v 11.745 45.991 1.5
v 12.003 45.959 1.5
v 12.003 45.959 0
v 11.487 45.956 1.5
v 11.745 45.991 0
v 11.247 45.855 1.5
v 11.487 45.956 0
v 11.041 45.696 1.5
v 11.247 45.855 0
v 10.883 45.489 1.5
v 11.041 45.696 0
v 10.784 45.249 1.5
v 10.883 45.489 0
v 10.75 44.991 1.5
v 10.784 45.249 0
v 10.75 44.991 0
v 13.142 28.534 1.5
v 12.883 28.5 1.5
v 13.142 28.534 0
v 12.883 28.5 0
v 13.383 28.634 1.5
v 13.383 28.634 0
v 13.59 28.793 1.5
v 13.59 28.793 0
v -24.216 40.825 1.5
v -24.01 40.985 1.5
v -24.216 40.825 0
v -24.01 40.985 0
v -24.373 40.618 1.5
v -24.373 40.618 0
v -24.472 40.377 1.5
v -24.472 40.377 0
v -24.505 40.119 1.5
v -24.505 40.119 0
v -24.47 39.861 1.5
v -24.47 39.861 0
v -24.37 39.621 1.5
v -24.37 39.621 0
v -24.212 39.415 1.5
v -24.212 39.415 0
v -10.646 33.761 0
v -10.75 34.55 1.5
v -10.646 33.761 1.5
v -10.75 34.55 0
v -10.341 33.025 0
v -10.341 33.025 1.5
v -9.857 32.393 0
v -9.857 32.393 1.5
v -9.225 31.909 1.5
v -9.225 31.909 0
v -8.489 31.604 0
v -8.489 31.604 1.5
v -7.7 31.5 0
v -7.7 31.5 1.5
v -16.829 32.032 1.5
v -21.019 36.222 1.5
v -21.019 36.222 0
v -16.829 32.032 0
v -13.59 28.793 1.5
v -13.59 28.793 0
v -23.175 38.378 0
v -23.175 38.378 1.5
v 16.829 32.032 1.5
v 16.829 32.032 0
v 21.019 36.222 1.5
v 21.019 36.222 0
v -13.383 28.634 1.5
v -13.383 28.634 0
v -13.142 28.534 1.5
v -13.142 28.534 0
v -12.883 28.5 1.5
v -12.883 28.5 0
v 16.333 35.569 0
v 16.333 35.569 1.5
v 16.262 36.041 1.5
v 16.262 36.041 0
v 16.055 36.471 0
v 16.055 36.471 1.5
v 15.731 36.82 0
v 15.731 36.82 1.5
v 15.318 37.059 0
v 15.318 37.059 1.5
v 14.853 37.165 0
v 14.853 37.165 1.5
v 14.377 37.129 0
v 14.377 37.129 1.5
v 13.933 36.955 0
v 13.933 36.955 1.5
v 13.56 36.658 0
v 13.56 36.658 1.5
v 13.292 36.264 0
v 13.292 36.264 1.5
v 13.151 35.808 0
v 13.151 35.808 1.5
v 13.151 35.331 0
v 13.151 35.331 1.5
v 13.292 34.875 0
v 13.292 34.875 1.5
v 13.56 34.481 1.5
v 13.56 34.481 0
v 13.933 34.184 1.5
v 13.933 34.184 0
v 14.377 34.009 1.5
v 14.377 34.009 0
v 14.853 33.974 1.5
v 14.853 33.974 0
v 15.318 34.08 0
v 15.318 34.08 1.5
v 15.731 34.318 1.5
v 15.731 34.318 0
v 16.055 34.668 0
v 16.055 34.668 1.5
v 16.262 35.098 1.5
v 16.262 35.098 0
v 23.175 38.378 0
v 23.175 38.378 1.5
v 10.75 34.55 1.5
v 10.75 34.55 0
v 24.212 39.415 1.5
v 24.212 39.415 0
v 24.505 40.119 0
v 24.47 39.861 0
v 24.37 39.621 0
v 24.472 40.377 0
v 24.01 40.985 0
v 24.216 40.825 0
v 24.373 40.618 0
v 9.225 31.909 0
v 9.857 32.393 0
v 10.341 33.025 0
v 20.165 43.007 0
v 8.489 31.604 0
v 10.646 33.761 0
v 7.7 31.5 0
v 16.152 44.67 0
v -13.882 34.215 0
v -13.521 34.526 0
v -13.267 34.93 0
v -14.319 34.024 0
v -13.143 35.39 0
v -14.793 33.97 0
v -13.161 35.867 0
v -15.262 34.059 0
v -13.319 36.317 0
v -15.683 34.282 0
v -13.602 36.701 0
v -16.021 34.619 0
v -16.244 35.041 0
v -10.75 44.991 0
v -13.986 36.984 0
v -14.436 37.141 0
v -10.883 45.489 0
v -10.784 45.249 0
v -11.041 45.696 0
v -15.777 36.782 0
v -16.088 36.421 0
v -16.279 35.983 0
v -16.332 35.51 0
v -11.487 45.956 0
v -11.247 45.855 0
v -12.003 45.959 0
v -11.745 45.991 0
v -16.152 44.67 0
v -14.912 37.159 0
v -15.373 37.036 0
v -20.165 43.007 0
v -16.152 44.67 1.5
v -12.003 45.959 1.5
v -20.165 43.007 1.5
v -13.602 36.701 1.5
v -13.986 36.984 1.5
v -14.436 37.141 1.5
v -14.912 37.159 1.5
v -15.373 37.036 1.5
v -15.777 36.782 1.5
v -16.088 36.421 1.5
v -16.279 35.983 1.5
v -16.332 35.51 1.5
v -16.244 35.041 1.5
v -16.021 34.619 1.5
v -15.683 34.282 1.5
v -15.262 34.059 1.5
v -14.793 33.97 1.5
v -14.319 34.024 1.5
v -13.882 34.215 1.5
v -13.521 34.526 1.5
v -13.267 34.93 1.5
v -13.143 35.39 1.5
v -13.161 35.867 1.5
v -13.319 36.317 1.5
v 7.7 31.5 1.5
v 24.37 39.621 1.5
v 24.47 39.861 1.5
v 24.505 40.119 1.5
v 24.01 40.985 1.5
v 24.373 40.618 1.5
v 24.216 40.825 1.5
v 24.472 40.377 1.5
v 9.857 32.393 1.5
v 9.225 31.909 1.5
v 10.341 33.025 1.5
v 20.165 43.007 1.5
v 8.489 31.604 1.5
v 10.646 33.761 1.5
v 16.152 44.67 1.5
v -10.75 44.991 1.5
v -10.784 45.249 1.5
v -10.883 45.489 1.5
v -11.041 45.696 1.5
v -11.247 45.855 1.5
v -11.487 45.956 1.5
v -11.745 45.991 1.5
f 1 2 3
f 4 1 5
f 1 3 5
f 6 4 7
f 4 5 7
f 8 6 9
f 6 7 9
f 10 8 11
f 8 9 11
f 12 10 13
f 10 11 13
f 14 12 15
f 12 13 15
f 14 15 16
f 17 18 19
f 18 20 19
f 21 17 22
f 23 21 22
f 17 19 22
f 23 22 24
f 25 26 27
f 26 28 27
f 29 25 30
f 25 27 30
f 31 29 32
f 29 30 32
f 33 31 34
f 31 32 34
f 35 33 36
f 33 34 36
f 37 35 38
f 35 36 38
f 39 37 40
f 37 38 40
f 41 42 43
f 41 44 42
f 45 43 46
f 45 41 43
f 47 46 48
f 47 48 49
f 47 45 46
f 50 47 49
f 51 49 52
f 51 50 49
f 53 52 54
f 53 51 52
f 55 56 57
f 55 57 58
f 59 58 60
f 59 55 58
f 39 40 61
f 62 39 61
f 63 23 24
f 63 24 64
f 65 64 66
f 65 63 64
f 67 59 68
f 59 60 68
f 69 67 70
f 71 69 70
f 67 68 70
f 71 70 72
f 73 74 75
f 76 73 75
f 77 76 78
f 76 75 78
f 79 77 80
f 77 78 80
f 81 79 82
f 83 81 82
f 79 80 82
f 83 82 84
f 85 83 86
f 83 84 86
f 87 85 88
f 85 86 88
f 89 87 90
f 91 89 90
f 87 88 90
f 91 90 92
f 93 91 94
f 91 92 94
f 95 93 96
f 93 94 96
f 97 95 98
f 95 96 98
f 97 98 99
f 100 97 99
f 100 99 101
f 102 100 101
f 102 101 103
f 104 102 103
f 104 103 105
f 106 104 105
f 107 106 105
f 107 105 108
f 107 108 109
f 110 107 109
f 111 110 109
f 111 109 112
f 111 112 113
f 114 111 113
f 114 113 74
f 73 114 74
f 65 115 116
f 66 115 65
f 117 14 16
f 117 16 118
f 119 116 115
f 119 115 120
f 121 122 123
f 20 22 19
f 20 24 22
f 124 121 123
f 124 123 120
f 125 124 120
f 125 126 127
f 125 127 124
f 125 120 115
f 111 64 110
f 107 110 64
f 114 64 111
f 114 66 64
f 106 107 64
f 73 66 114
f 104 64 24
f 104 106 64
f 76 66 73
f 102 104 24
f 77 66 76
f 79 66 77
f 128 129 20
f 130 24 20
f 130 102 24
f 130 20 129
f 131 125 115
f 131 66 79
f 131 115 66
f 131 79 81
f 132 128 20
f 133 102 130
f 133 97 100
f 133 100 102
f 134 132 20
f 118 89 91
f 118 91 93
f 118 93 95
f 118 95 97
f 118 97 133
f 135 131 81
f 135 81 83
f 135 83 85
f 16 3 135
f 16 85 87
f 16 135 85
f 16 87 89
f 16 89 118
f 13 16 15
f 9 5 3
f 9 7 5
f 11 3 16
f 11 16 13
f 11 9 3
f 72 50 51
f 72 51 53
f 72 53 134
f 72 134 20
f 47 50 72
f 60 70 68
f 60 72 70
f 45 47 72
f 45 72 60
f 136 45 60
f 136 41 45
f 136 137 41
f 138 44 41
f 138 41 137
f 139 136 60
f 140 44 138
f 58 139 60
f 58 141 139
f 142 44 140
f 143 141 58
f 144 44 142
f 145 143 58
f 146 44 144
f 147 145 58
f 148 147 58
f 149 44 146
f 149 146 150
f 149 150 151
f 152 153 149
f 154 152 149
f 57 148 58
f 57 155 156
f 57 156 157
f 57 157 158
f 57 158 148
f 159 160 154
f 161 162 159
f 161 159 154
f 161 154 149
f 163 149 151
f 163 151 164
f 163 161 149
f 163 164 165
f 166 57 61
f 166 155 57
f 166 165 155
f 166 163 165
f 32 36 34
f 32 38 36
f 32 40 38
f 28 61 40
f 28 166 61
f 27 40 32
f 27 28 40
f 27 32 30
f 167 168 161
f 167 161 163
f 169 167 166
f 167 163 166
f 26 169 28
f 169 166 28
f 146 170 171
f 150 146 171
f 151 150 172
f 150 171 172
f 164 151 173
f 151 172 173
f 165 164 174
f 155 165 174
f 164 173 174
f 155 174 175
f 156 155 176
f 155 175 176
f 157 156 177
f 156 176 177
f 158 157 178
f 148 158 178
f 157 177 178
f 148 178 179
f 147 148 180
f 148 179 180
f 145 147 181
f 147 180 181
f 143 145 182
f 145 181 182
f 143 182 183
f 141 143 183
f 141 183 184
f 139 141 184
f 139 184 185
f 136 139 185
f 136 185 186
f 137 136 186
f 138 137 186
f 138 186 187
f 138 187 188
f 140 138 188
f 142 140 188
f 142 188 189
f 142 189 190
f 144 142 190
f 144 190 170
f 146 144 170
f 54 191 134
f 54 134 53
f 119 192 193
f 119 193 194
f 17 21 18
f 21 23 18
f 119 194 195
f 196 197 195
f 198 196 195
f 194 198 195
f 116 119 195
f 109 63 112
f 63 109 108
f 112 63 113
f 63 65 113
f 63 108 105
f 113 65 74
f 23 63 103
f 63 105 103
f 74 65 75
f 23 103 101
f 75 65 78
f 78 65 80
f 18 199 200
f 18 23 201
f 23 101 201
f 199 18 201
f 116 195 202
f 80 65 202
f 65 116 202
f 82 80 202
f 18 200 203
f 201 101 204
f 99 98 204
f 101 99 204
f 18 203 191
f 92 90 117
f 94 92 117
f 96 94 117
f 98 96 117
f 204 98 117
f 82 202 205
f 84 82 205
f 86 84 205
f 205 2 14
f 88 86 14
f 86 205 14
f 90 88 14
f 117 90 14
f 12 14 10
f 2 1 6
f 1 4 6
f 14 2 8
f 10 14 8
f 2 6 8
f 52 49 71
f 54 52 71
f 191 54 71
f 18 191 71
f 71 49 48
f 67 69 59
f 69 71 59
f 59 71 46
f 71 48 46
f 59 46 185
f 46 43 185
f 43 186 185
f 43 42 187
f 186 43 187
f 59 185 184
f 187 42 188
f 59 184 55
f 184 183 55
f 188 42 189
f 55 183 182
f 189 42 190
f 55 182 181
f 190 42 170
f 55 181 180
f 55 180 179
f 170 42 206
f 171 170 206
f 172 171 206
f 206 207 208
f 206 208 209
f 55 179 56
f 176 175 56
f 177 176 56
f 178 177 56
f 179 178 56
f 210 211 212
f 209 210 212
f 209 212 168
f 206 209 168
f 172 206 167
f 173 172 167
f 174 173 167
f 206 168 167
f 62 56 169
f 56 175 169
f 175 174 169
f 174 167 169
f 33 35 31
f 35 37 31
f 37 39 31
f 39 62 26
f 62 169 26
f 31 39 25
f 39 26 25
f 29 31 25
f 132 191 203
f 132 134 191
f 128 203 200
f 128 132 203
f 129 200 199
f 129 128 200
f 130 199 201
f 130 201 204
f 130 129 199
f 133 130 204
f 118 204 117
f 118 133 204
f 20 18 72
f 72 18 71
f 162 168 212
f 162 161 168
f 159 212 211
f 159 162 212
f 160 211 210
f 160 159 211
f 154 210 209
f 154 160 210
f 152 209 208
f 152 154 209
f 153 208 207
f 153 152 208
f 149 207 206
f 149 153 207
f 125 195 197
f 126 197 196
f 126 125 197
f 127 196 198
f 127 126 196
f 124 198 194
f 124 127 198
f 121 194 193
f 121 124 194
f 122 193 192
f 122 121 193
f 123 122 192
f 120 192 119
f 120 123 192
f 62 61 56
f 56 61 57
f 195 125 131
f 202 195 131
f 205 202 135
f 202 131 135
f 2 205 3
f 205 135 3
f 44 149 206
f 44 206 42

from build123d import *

# Parameters (mm, degrees)
SKETCH_1_R                       = 47.5
EXTRUDE_1_DEPTH                  = 1.5
CUT_EXTRUDE_1_DEPTH              = 68.191889392
CUT_EXTRUDE_2_DEPTH              = 68.191889392
CUT_EXTRUDE_2_DEPTH_BACK         = 68.191889392
SKETCH_3_R                       = 3.1
SKETCH_3_R_2                     = 1.6
SKETCH_4_R                       = 1.6
CUT_EXTRUDE_3_DEPTH              = 68.191889392
CUT_EXTRUDE_4_DEPTH              = 68.191889392
FILLET_1_R                       = 1
FILLET_2_R                       = 0.2
FILLET_3_R                       = 3.05
PATTERN_CIRCULAR_1_COUNT         = 8
FILLET_1_OF_PATTERN_CIRCULAR_1_R = 1
FILLET_2_OF_PATTERN_CIRCULAR_1_R = 0.2
FILLET_3_OF_PATTERN_CIRCULAR_1_R = 3.05
CUT_EXTRUDE_5_DEPTH              = 66.05834985
EXTRUDE_START                    = -1.5
EXTRUDE_2_DEPTH                  = 1.5
FILLET_4_R                       = 1


with BuildPart() as part:
    # ｽｹｯﾁ1 → ﾎﾞｽ - 押し出し1 (new body)
    with BuildSketch(Plane.XY):
        Circle(SKETCH_1_R)
    extrude(amount=EXTRUDE_1_DEPTH)

    # ｽｹｯﾁ2 → ｶｯﾄ - 押し出し1 (cut, through all)
    with BuildSketch(Plane.XY.offset(1.5)):
        Polygon((-10.75, 43.525), (-10.75, 52.5), (10.75, 52.5), (10.75, 43.525), (13, 43.525), (13, 40.475), (10.75, 40.475), (10.75, 31.5), (-10.75, 31.5), (-10.75, 40.475), (-13, 40.475), (-13, 43.525), align=None)
    cut_extrude_1 = extrude(amount=-CUT_EXTRUDE_1_DEPTH, mode=Mode.SUBTRACT)

    # ｽｹｯﾁ3 → ｶｯﾄ - 押し出し2 (cut, two sides: drawn at the far end of the back side and taken through both)
    with BuildSketch(Plane.XY.offset(1.5).offset(-CUT_EXTRUDE_2_DEPTH_BACK)):
        Circle(SKETCH_3_R)
        with Locations((0, 6.5)):
            Circle(SKETCH_3_R_2)
        with Locations((6.5, 0)):
            Circle(SKETCH_3_R_2)
        with Locations((0, -6.5)):
            Circle(SKETCH_3_R_2)
        with Locations((-6.5, 0)):
            Circle(SKETCH_3_R_2)
        with Locations((8.838834765, 8.838834765)):
            Circle(SKETCH_3_R_2)
        with Locations((8.838834765, -8.838834765)):
            Circle(SKETCH_3_R_2)
        with Locations((-8.838834765, -8.838834765)):
            Circle(SKETCH_3_R_2)
        with Locations((-8.838834765, 8.838834765)):
            Circle(SKETCH_3_R_2)
    extrude(amount=CUT_EXTRUDE_2_DEPTH + CUT_EXTRUDE_2_DEPTH_BACK, mode=Mode.SUBTRACT)

    # ｽｹｯﾁ4 → ｶｯﾄ - 押し出し3 (cut, through all)
    with BuildSketch(Plane.XY.offset(1.5)):
        with Locations((14.733312146, 35.569362002)):
            Circle(SKETCH_4_R)
        with Locations((8.610377228, 20.787289482)):
            Circle(SKETCH_4_R)
    cut_extrude_3 = extrude(amount=-CUT_EXTRUDE_3_DEPTH, mode=Mode.SUBTRACT)

    # ｽｹｯﾁ5 → ｶｯﾄ - 押し出し4 (cut, symmetric)
    with BuildSketch(Plane.XY.offset(1.5)):
        Polygon((-7.188286702, 26.5), (7.188286702, 26.5), (3.328075632, 17.180626082), (-3.328075632, 17.180626082), align=None)
    cut_extrude_4 = extrude(amount=CUT_EXTRUDE_4_DEPTH, both=True, mode=Mode.SUBTRACT)

    # ﾌｨﾚｯﾄ1
    fillet_1_edges = [part.edges().sort_by_distance(p)[0] for p in [
        (-3.328075632, 17.180626082, 0.75),
        (3.328075632, 17.180626082, 0.75),
        (7.188286702, 26.5, 0.75),
        (-7.188286702, 26.5, 0.75),
        (10.75, 46.267564232, 0.75),
        (-10.75, 46.267564232, 0.75),
    ]]
    fillet(fillet_1_edges, radius=FILLET_1_R)

    # ﾌｨﾚｯﾄ2
    fillet_2_edges = [part.edges().sort_by_distance(p)[0] for p in [
        (13, 43.525, 0.75),
        (13, 40.475, 0.75),
        (-13, 43.525, 0.75),
        (-13, 40.475, 0.75),
    ]]
    fillet(fillet_2_edges, radius=FILLET_2_R)

    # ﾌｨﾚｯﾄ3
    fillet_3_edges = [part.edges().sort_by_distance(p)[0] for p in [
        (10.75, 31.5, 0.75),
        (-10.75, 31.5, 0.75),
    ]]
    fillet(fillet_3_edges, radius=FILLET_3_R)

    # 円形ﾊﾟﾀｰﾝ1: ｶｯﾄ - 押し出し1, ｶｯﾄ - 押し出し3, ｶｯﾄ - 押し出し4 ×8 about axis
    pattern_circular_1_axis = Axis((0, 0, 0), (0, 0, 1))
    add([cut_extrude_1.rotate(pattern_circular_1_axis, i * 360 / PATTERN_CIRCULAR_1_COUNT) for i in range(1, PATTERN_CIRCULAR_1_COUNT)], mode=Mode.SUBTRACT)
    add([cut_extrude_3.rotate(pattern_circular_1_axis, i * 360 / PATTERN_CIRCULAR_1_COUNT) for i in range(1, PATTERN_CIRCULAR_1_COUNT)], mode=Mode.SUBTRACT)
    add([cut_extrude_4.rotate(pattern_circular_1_axis, i * 360 / PATTERN_CIRCULAR_1_COUNT) for i in range(1, PATTERN_CIRCULAR_1_COUNT)], mode=Mode.SUBTRACT)

    # ﾌｨﾚｯﾄ1 of 円形ﾊﾟﾀｰﾝ1
    fillet_1_of_pattern_circular_1_edges = [part.edges().sort_by_distance(p)[0] for p in [
        (-14.501842056, 9.79523236, 0.75),
        (-9.79523236, 14.501842056, 0.75),
        (-13.655443429, 23.821215973, 0.75),
        (-23.821215973, 13.655443429, 0.75),
        (-25.11471052, 40.317506315, 0.75),
        (-40.317506315, 25.11471052, 0.75),
        (-17.180626082, -3.328075632, 0.75),
        (-17.180626082, 3.328075632, 0.75),
        (-26.5, 7.188286702, 0.75),
        (-26.5, -7.188286702, 0.75),
        (-46.267564232, 10.75, 0.75),
        (-46.267564232, -10.75, 0.75),
        (-9.79523236, -14.501842056, 0.75),
        (-14.501842056, -9.79523236, 0.75),
        (-23.821215973, -13.655443429, 0.75),
        (-13.655443429, -23.821215973, 0.75),
        (-40.317506315, -25.11471052, 0.75),
        (-25.11471052, -40.317506315, 0.75),
        (3.328075632, -17.180626082, 0.75),
        (-3.328075632, -17.180626082, 0.75),
        (-7.188286702, -26.5, 0.75),
        (7.188286702, -26.5, 0.75),
        (-10.75, -46.267564232, 0.75),
        (10.75, -46.267564232, 0.75),
        (14.501842056, -9.79523236, 0.75),
        (9.79523236, -14.501842056, 0.75),
        (13.655443429, -23.821215973, 0.75),
        (23.821215973, -13.655443429, 0.75),
        (25.11471052, -40.317506315, 0.75),
        (40.317506315, -25.11471052, 0.75),
        (17.180626082, 3.328075632, 0.75),
        (17.180626082, -3.328075632, 0.75),
        (26.5, -7.188286702, 0.75),
        (26.5, 7.188286702, 0.75),
        (46.267564232, -10.75, 0.75),
        (46.267564232, 10.75, 0.75),
        (9.79523236, 14.501842056, 0.75),
        (14.501842056, 9.79523236, 0.75),
        (23.821215973, 13.655443429, 0.75),
        (13.655443429, 23.821215973, 0.75),
        (40.317506315, 25.11471052, 0.75),
        (25.11471052, 40.317506315, 0.75),
    ]]
    fillet(fillet_1_of_pattern_circular_1_edges, radius=FILLET_1_OF_PATTERN_CIRCULAR_1_R)

    # ﾌｨﾚｯﾄ2 of 円形ﾊﾟﾀｰﾝ1
    fillet_2_of_pattern_circular_1_edges = [part.edges().sort_by_distance(p)[0] for p in [
        (-21.584434496, 39.969210807, 0.75),
        (-19.427758813, 37.812535124, 0.75),
        (-39.969210807, 21.584434496, 0.75),
        (-37.812535124, 19.427758813, 0.75),
        (-43.525, 13, 0.75),
        (-40.475, 13, 0.75),
        (-43.525, -13, 0.75),
        (-40.475, -13, 0.75),
        (-39.969210807, -21.584434496, 0.75),
        (-37.812535124, -19.427758813, 0.75),
        (-21.584434496, -39.969210807, 0.75),
        (-19.427758813, -37.812535124, 0.75),
        (-13, -43.525, 0.75),
        (-13, -40.475, 0.75),
        (13, -43.525, 0.75),
        (13, -40.475, 0.75),
        (21.584434496, -39.969210807, 0.75),
        (19.427758813, -37.812535124, 0.75),
        (39.969210807, -21.584434496, 0.75),
        (37.812535124, -19.427758813, 0.75),
        (43.525, -13, 0.75),
        (40.475, -13, 0.75),
        (43.525, 13, 0.75),
        (40.475, 13, 0.75),
        (39.969210807, 21.584434496, 0.75),
        (37.812535124, 19.427758813, 0.75),
        (21.584434496, 39.969210807, 0.75),
        (19.427758813, 37.812535124, 0.75),
    ]]
    fillet(fillet_2_of_pattern_circular_1_edges, radius=FILLET_2_OF_PATTERN_CIRCULAR_1_R)

    # ﾌｨﾚｯﾄ3 of 円形ﾊﾟﾀｰﾝ1
    fillet_3_of_pattern_circular_1_edges = [part.edges().sort_by_distance(p)[0] for p in [
        (-14.67246571, 29.875261505, 0.75),
        (-29.875261505, 14.67246571, 0.75),
        (-31.5, 10.75, 0.75),
        (-31.5, -10.75, 0.75),
        (-29.875261505, -14.67246571, 0.75),
        (-14.67246571, -29.875261505, 0.75),
        (-10.75, -31.5, 0.75),
        (10.75, -31.5, 0.75),
        (14.67246571, -29.875261505, 0.75),
        (29.875261505, -14.67246571, 0.75),
        (31.5, -10.75, 0.75),
        (31.5, 10.75, 0.75),
        (29.875261505, 14.67246571, 0.75),
        (14.67246571, 29.875261505, 0.75),
    ]]
    fillet(fillet_3_of_pattern_circular_1_edges, radius=FILLET_3_OF_PATTERN_CIRCULAR_1_R)

    # ｽｹｯﾁ6 → ｶｯﾄ - 押し出し5 (cut, through all)
    with BuildSketch(Plane.XY.offset(1.5)):
        with BuildLine():
            Line((13.297204204, 28.5), (7.7, 28.5))
            Line((7.7, 28.5), (-7.7, 28.5))
            Line((-7.7, 28.5), (-13.297204204, 28.5))
            Line((-13.297204204, 28.5), (-16.829141392, 32.031937188))
            ThreePointArc((-16.829141392, 32.031937188), (-15.935817075, 29.875261505), (-16.829141392, 27.718585823))
            Line((-16.829141392, 27.718585823), (-27.718585823, 16.829141392))
            ThreePointArc((-27.718585823, 16.829141392), (-29.875261505, 15.935817075), (-32.031937188, 16.829141392))
            Line((-32.031937188, 16.829141392), (-36.221544866, 21.018749071))
            Line((-36.221544866, 21.018749071), (-37.671113768, 19.569180169))
            ThreePointArc((-37.671113768, 19.569180169), (-37.812535124, 19.510601526), (-37.95395648, 19.569180169))
            Line((-37.95395648, 19.569180169), (-39.82778945, 21.443013139))
            ThreePointArc((-39.82778945, 21.443013139), (-39.886368094, 21.584434496), (-39.82778945, 21.725855852))
            Line((-39.82778945, 21.725855852), (-38.378220549, 23.175424753))
            Line((-38.378220549, 23.175424753), (-39.414818808, 24.212023012))
            ThreePointArc((-39.414818808, 24.212023012), (-40.249307357, 24.496769993), (-40.984762698, 24.010398301))
            ThreePointArc((-40.984762698, 24.010398301), (-43.884277794, 18.177463037), (-45.958519087, 12.002688172))
            ThreePointArc((-45.958519087, 12.002688172), (-45.78239035, 11.138725991), (-44.990971316, 10.75))
            Line((-44.990971316, 10.75), (-43.525, 10.75))
            Line((-43.525, 10.75), (-43.525, 12.8))
            ThreePointArc((-43.525, 12.8), (-43.466421356, 12.941421356), (-43.325, 13))
            Line((-43.325, 13), (-40.675, 13))
            ThreePointArc((-40.675, 13), (-40.533578644, 12.941421356), (-40.475, 12.8))
            Line((-40.475, 12.8), (-40.475, 10.75))
            Line((-40.475, 10.75), (-34.55, 10.75))
            ThreePointArc((-34.55, 10.75), (-32.393324317, 9.856675683), (-31.5, 7.7))
            Line((-31.5, 7.7), (-31.5, -7.7))
            ThreePointArc((-31.5, -7.7), (-32.393324317, -9.856675683), (-34.55, -10.75))
            Line((-34.55, -10.75), (-40.475, -10.75))
            Line((-40.475, -10.75), (-40.475, -12.8))
            ThreePointArc((-40.475, -12.8), (-40.533578644, -12.941421356), (-40.675, -13))
            Line((-40.675, -13), (-43.325, -13))
            ThreePointArc((-43.325, -13), (-43.466421356, -12.941421356), (-43.525, -12.8))
            Line((-43.525, -12.8), (-43.525, -10.75))
            Line((-43.525, -10.75), (-44.990971316, -10.75))
            ThreePointArc((-44.990971316, -10.75), (-45.78239035, -11.138725991), (-45.958519087, -12.002688172))
            ThreePointArc((-45.958519087, -12.002688172), (-43.884277794, -18.177463037), (-40.984762698, -24.010398301))
            ThreePointArc((-40.984762698, -24.010398301), (-40.249307357, -24.496769993), (-39.414818808, -24.212023012))
            Line((-39.414818808, -24.212023012), (-38.378220549, -23.175424753))
            Line((-38.378220549, -23.175424753), (-39.82778945, -21.725855852))
            ThreePointArc((-39.82778945, -21.725855852), (-39.886368094, -21.584434496), (-39.82778945, -21.443013139))
            Line((-39.82778945, -21.443013139), (-37.95395648, -19.569180169))
            ThreePointArc((-37.95395648, -19.569180169), (-37.812535124, -19.510601526), (-37.671113768, -19.569180169))
            Line((-37.671113768, -19.569180169), (-36.221544866, -21.018749071))
            Line((-36.221544866, -21.018749071), (-32.031937188, -16.829141392))
            ThreePointArc((-32.031937188, -16.829141392), (-29.875261505, -15.935817075), (-27.718585823, -16.829141392))
            Line((-27.718585823, -16.829141392), (-16.829141392, -27.718585823))
            ThreePointArc((-16.829141392, -27.718585823), (-15.935817075, -29.875261505), (-16.829141392, -32.031937188))
            Line((-16.829141392, -32.031937188), (-21.018749071, -36.221544866))
            Line((-21.018749071, -36.221544866), (-19.569180169, -37.671113768))
            ThreePointArc((-19.569180169, -37.671113768), (-19.510601526, -37.812535124), (-19.569180169, -37.95395648))
            Line((-19.569180169, -37.95395648), (-21.443013139, -39.82778945))
            ThreePointArc((-21.443013139, -39.82778945), (-21.584434496, -39.886368094), (-21.725855852, -39.82778945))
            Line((-21.725855852, -39.82778945), (-23.175424753, -38.378220549))
            Line((-23.175424753, -38.378220549), (-24.212023012, -39.414818808))
            ThreePointArc((-24.212023012, -39.414818808), (-24.496769993, -40.249307357), (-24.010398301, -40.984762698))
            ThreePointArc((-24.010398301, -40.984762698), (-18.177463037, -43.884277794), (-12.002688172, -45.958519087))
            ThreePointArc((-12.002688172, -45.958519087), (-11.138725991, -45.78239035), (-10.75, -44.990971316))
            Line((-10.75, -44.990971316), (-10.75, -43.525))
            Line((-10.75, -43.525), (-12.8, -43.525))
            ThreePointArc((-12.8, -43.525), (-12.941421356, -43.466421356), (-13, -43.325))
            Line((-13, -43.325), (-13, -40.675))
            ThreePointArc((-13, -40.675), (-12.941421356, -40.533578644), (-12.8, -40.475))
            Line((-12.8, -40.475), (-10.75, -40.475))
            Line((-10.75, -40.475), (-10.75, -34.55))
            ThreePointArc((-10.75, -34.55), (-9.856675683, -32.393324317), (-7.7, -31.5))
            Line((-7.7, -31.5), (7.7, -31.5))
            ThreePointArc((7.7, -31.5), (9.856675683, -32.393324317), (10.75, -34.55))
            Line((10.75, -34.55), (10.75, -40.475))
            Line((10.75, -40.475), (12.8, -40.475))
            ThreePointArc((12.8, -40.475), (12.941421356, -40.533578644), (13, -40.675))
            Line((13, -40.675), (13, -43.325))
            ThreePointArc((13, -43.325), (12.941421356, -43.466421356), (12.8, -43.525))
            Line((12.8, -43.525), (10.75, -43.525))
            Line((10.75, -43.525), (10.75, -44.990971316))
            ThreePointArc((10.75, -44.990971316), (11.138725991, -45.78239035), (12.002688172, -45.958519087))
            ThreePointArc((12.002688172, -45.958519087), (18.177463037, -43.884277794), (24.010398301, -40.984762698))
            ThreePointArc((24.010398301, -40.984762698), (24.496769993, -40.249307357), (24.212023012, -39.414818808))
            Line((24.212023012, -39.414818808), (23.175424753, -38.378220549))
            Line((23.175424753, -38.378220549), (21.725855852, -39.82778945))
            ThreePointArc((21.725855852, -39.82778945), (21.584434496, -39.886368094), (21.443013139, -39.82778945))
            Line((21.443013139, -39.82778945), (19.569180169, -37.95395648))
            ThreePointArc((19.569180169, -37.95395648), (19.510601526, -37.812535124), (19.569180169, -37.671113768))
            Line((19.569180169, -37.671113768), (21.018749071, -36.221544866))
            Line((21.018749071, -36.221544866), (16.829141392, -32.031937188))
            ThreePointArc((16.829141392, -32.031937188), (15.935817075, -29.875261505), (16.829141392, -27.718585823))
            Line((16.829141392, -27.718585823), (27.718585823, -16.829141392))
            ThreePointArc((27.718585823, -16.829141392), (29.875261505, -15.935817075), (32.031937188, -16.829141392))
            Line((32.031937188, -16.829141392), (36.221544866, -21.018749071))
            Line((36.221544866, -21.018749071), (37.671113768, -19.569180169))
            ThreePointArc((37.671113768, -19.569180169), (37.812535124, -19.510601526), (37.95395648, -19.569180169))
            Line((37.95395648, -19.569180169), (39.82778945, -21.443013139))
            ThreePointArc((39.82778945, -21.443013139), (39.886368094, -21.584434496), (39.82778945, -21.725855852))
            Line((39.82778945, -21.725855852), (38.378220549, -23.175424753))
            Line((38.378220549, -23.175424753), (39.414818808, -24.212023012))
            ThreePointArc((39.414818808, -24.212023012), (40.249307357, -24.496769993), (40.984762698, -24.010398301))
            ThreePointArc((40.984762698, -24.010398301), (43.884277794, -18.177463037), (45.958519087, -12.002688172))
            ThreePointArc((45.958519087, -12.002688172), (45.78239035, -11.138725991), (44.990971316, -10.75))
            Line((44.990971316, -10.75), (43.525, -10.75))
            Line((43.525, -10.75), (43.525, -12.8))
            ThreePointArc((43.525, -12.8), (43.466421356, -12.941421356), (43.325, -13))
            Line((43.325, -13), (40.675, -13))
            ThreePointArc((40.675, -13), (40.533578644, -12.941421356), (40.475, -12.8))
            Line((40.475, -12.8), (40.475, -10.75))
            Line((40.475, -10.75), (34.55, -10.75))
            ThreePointArc((34.55, -10.75), (32.393324317, -9.856675683), (31.5, -7.7))
            Line((31.5, -7.7), (31.5, 7.7))
            ThreePointArc((31.5, 7.7), (32.393324317, 9.856675683), (34.55, 10.75))
            Line((34.55, 10.75), (40.475, 10.75))
            Line((40.475, 10.75), (40.475, 12.8))
            ThreePointArc((40.475, 12.8), (40.533578644, 12.941421356), (40.675, 13))
            Line((40.675, 13), (43.325, 13))
            ThreePointArc((43.325, 13), (43.466421356, 12.941421356), (43.525, 12.8))
            Line((43.525, 12.8), (43.525, 10.75))
            Line((43.525, 10.75), (44.990971316, 10.75))
            ThreePointArc((44.990971316, 10.75), (45.78239035, 11.138725991), (45.958519087, 12.002688172))
            ThreePointArc((45.958519087, 12.002688172), (43.884277794, 18.177463037), (40.984762698, 24.010398301))
            ThreePointArc((40.984762698, 24.010398301), (40.249307357, 24.496769993), (39.414818808, 24.212023012))
            Line((39.414818808, 24.212023012), (38.378220549, 23.175424753))
            Line((38.378220549, 23.175424753), (39.82778945, 21.725855852))
            ThreePointArc((39.82778945, 21.725855852), (39.886368094, 21.584434496), (39.82778945, 21.443013139))
            Line((39.82778945, 21.443013139), (37.95395648, 19.569180169))
            ThreePointArc((37.95395648, 19.569180169), (37.812535124, 19.510601526), (37.671113768, 19.569180169))
            Line((37.671113768, 19.569180169), (36.221544866, 21.018749071))
            Line((36.221544866, 21.018749071), (32.031937188, 16.829141392))
            ThreePointArc((32.031937188, 16.829141392), (29.875261505, 15.935817075), (27.718585823, 16.829141392))
            Line((27.718585823, 16.829141392), (16.829141392, 27.718585823))
            ThreePointArc((16.829141392, 27.718585823), (15.935817075, 29.875261505), (16.829141392, 32.031937188))
            Line((16.829141392, 32.031937188), (13.297204204, 28.5))
        make_face()
    extrude(amount=-CUT_EXTRUDE_5_DEPTH, mode=Mode.SUBTRACT)

    # ｽｹｯﾁ7 → ﾎﾞｽ - 押し出し2 (add)
    with BuildSketch(Plane.XY.offset(1.5).offset(EXTRUDE_START)):
        with BuildLine():
            Line((-10.75, 40.475), (-10.75, 43.525))
            Line((-10.75, 43.525), (-12.8, 43.525))
            ThreePointArc((-12.8, 43.525), (-12.941421356, 43.466421356), (-13, 43.325))
            Line((-13, 43.325), (-13, 40.675))
            ThreePointArc((-13, 40.675), (-12.941421356, 40.533578644), (-12.8, 40.475))
            Line((-12.8, 40.475), (-10.75, 40.475))
        make_face()
        with BuildLine():
            Line((-21.725855852, 39.82778945), (-23.175424753, 38.378220549))
            Line((-23.175424753, 38.378220549), (-21.018749071, 36.221544866))
            Line((-21.018749071, 36.221544866), (-19.569180169, 37.671113768))
            ThreePointArc((-19.569180169, 37.671113768), (-19.510601526, 37.812535124), (-19.569180169, 37.95395648))
            Line((-19.569180169, 37.95395648), (-21.443013139, 39.82778945))
            ThreePointArc((-21.443013139, 39.82778945), (-21.584434496, 39.886368094), (-21.725855852, 39.82778945))
        make_face()
        with BuildLine():
            Line((10.75, 43.525), (10.75, 40.475))
            Line((10.75, 40.475), (12.8, 40.475))
            ThreePointArc((12.8, 40.475), (12.941421356, 40.533578644), (13, 40.675))
            Line((13, 40.675), (13, 43.325))
            ThreePointArc((13, 43.325), (12.941421356, 43.466421356), (12.8, 43.525))
            Line((12.8, 43.525), (10.75, 43.525))
        make_face()
        with BuildLine():
            Line((19.569180169, 37.671113768), (21.018749071, 36.221544866))
            Line((21.018749071, 36.221544866), (23.175424753, 38.378220549))
            Line((23.175424753, 38.378220549), (21.725855852, 39.82778945))
            ThreePointArc((21.725855852, 39.82778945), (21.584434496, 39.886368094), (21.443013139, 39.82778945))
            Line((21.443013139, 39.82778945), (19.569180169, 37.95395648))
            ThreePointArc((19.569180169, 37.95395648), (19.510601526, 37.812535124), (19.569180169, 37.671113768))
        make_face()
    extrude(amount=EXTRUDE_2_DEPTH)

    # ﾌｨﾚｯﾄ4
    fillet_4_edges = [part.edges().sort_by_distance(p)[0] for p in [
        (13.297204204, 28.5, 0.75),
        (-13.297204204, 28.5, 0.75),
    ]]
    fillet(fillet_4_edges, radius=FILLET_4_R)


solid = part.part
